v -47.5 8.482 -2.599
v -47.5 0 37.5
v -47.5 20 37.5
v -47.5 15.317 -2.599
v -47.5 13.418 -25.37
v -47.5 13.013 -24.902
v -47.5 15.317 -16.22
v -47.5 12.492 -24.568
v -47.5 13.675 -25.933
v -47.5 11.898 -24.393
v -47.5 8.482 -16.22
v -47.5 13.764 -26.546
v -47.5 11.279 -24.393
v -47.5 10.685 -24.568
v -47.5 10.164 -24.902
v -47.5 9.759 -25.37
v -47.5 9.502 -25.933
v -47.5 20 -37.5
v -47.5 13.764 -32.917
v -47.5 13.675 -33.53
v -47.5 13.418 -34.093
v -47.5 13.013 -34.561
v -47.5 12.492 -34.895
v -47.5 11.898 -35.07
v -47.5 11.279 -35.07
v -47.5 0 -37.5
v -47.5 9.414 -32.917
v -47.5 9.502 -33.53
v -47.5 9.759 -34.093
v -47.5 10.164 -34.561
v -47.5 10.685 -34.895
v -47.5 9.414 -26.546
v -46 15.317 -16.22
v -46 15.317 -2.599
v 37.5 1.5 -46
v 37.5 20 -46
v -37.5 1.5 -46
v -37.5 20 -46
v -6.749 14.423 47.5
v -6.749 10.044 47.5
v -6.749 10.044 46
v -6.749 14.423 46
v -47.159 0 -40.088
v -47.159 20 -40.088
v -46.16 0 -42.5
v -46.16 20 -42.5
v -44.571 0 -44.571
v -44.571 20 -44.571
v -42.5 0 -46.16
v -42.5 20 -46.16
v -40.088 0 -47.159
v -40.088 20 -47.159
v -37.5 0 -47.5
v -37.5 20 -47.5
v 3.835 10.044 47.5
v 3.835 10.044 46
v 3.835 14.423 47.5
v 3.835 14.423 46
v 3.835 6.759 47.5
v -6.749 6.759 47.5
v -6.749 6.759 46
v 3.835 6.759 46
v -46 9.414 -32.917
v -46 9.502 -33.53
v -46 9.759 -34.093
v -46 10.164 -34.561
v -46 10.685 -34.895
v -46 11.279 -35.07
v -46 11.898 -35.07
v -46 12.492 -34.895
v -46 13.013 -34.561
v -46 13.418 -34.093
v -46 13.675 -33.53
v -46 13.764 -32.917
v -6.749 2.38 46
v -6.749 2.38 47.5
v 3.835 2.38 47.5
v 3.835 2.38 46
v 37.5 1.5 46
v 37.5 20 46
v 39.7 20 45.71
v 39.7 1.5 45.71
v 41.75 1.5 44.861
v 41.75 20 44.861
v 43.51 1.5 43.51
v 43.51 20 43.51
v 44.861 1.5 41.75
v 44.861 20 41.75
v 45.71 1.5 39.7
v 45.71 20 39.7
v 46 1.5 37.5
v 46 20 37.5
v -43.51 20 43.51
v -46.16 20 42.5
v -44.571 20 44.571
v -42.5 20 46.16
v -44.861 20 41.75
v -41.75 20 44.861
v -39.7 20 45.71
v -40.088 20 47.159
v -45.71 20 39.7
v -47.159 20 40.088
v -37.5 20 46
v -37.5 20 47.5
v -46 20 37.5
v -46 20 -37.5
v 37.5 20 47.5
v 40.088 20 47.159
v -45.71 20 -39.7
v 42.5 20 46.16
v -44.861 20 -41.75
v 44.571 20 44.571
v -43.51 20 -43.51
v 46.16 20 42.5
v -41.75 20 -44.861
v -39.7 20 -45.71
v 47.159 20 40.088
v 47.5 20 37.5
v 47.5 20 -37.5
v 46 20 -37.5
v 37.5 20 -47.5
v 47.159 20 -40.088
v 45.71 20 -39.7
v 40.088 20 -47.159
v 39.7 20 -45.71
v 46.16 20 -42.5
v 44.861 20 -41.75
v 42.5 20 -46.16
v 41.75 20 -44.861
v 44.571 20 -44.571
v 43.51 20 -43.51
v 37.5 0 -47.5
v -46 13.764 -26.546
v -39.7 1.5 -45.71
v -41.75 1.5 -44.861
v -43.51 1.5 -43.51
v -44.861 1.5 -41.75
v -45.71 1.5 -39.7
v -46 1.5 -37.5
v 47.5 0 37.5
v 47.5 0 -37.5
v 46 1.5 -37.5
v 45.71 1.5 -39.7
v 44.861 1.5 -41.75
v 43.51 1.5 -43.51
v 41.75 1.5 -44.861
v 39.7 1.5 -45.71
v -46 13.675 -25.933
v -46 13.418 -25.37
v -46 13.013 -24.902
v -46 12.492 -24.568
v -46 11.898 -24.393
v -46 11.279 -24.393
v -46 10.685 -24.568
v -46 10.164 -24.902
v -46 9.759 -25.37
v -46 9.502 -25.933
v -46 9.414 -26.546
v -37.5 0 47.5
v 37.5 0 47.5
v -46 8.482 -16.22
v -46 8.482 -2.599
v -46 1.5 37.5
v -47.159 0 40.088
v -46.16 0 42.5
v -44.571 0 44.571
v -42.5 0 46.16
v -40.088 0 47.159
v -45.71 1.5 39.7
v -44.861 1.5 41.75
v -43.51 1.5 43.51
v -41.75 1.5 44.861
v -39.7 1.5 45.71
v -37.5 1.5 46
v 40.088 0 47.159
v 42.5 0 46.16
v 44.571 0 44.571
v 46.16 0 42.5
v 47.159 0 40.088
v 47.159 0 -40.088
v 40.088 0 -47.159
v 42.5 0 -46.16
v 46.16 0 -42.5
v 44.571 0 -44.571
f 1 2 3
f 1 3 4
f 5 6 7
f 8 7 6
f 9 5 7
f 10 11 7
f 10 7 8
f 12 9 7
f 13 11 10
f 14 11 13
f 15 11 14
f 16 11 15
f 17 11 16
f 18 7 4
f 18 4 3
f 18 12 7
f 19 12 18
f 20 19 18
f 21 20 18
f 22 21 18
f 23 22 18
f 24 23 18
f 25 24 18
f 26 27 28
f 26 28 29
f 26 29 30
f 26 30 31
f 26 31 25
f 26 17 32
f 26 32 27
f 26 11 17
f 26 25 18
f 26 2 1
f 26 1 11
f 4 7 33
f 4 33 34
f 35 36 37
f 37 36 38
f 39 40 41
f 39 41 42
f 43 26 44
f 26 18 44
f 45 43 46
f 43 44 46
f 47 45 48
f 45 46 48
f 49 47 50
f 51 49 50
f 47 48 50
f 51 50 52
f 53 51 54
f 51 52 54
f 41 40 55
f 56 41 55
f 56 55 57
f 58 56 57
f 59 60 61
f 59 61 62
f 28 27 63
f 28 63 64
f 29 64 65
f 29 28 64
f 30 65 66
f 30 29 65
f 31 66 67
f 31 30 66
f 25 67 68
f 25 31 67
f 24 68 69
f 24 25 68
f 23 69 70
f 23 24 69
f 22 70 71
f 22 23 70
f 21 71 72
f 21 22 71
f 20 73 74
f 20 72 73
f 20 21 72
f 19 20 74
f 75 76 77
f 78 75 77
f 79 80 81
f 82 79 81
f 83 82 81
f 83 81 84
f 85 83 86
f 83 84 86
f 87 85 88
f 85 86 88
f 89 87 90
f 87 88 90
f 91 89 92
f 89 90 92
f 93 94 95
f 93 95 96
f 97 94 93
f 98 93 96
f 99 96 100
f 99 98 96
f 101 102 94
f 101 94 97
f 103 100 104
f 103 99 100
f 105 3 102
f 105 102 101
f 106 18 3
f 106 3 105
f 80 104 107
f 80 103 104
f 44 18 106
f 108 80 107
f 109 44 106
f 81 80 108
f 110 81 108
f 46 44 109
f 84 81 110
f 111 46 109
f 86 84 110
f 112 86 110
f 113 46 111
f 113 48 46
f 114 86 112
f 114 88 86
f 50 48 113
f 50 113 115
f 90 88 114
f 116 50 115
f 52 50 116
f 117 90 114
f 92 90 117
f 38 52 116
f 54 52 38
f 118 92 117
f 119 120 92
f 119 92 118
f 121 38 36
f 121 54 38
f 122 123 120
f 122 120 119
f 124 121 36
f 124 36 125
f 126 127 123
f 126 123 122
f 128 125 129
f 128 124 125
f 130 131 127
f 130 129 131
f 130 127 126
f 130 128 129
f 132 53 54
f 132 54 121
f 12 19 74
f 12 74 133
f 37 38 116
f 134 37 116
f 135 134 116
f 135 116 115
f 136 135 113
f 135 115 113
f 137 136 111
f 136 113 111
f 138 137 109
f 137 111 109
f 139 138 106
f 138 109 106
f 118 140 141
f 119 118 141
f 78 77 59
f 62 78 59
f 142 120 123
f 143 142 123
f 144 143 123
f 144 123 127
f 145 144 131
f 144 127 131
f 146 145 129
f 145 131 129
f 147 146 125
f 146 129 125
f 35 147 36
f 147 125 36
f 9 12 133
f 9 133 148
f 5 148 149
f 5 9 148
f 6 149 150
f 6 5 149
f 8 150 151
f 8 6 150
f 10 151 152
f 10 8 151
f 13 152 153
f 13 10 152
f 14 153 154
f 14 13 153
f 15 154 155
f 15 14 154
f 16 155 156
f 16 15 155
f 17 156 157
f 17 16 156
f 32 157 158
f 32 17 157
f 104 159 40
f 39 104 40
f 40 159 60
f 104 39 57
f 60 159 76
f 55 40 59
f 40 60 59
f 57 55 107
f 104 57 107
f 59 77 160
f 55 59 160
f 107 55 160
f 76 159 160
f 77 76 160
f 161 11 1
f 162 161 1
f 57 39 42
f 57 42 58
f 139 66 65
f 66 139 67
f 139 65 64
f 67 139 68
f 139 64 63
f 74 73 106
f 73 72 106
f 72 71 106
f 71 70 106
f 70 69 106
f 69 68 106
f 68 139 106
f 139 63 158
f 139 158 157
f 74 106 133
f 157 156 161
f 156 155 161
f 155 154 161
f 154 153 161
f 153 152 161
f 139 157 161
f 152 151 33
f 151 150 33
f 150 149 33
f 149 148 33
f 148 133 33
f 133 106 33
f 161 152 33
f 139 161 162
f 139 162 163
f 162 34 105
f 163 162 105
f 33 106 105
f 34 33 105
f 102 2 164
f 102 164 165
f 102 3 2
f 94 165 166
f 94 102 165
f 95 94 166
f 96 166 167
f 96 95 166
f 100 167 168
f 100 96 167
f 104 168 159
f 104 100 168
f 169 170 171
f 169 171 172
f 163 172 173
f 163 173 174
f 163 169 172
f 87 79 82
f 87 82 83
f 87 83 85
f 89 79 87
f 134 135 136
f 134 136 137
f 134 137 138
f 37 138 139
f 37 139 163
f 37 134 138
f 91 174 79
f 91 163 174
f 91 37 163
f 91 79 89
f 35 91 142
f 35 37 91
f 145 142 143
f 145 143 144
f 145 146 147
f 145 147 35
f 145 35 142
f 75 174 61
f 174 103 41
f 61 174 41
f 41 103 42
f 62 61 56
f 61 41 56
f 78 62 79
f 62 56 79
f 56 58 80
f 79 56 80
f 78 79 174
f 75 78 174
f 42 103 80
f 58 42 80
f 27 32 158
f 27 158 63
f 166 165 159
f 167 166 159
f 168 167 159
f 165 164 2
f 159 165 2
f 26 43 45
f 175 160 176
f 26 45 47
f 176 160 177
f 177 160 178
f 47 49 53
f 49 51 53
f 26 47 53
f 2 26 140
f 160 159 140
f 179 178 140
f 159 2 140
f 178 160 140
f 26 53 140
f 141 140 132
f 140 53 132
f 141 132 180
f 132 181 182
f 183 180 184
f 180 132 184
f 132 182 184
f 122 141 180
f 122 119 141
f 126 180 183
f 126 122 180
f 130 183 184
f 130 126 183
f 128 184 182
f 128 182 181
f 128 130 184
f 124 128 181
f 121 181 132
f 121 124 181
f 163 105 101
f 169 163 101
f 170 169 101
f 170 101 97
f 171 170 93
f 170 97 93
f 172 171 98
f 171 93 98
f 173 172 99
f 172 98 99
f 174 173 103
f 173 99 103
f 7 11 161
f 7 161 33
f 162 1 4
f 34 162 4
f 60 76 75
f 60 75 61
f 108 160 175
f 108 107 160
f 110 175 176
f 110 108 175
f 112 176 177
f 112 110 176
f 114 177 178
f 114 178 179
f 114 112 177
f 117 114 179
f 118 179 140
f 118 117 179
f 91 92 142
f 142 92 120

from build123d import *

# Parameters (mm, degrees)
SKETCH1_W           = 95
SKETCH1_H           = 95
BOSS_EXTRUDE1_DEPTH = 20
FILLET1_R           = 10
CUT_EXTRUDE5_DEPTH  = 18.5
CUT_EXTRUDE6_DEPTH  = 10
SKETCH6_W           = 13.621181439
SKETCH6_H           = 6.835350155
CUT_EXTRUDE7_DEPTH  = 10
SKETCH9_W           = 10.583669907
SKETCH9_H           = 4.379449617
CUT_EXTRUDE10_DEPTH = 10


with BuildPart() as part:
    # Sketch1 → Boss-Extrude1 (new body)
    with BuildSketch(Plane(origin=(0, 0, 0), x_dir=(1, 0, 0), z_dir=(0, 1, 0))):
        Rectangle(SKETCH1_W, SKETCH1_H)
    extrude(amount=BOSS_EXTRUDE1_DEPTH)

    # Fillet1
    fillet1_edges = [part.edges().sort_by_distance(p)[0] for p in [
        (47.5, 10, 47.5),
        (-47.5, 10, 47.5),
        (-47.5, 10, -47.5),
        (47.5, 10, -47.5),
    ]]
    fillet(fillet1_edges, radius=FILLET1_R)

    # Sketch4 → Cut-Extrude5 (cut)
    with BuildSketch(Plane(origin=(0, 20, 0), x_dir=(1, 0, 0), z_dir=(0, 1, 0))):
        with BuildLine():
            Line((37.5, 46), (-37.5, 46))
            ThreePointArc((-37.5, 46), (-43.51040764, 43.51040764), (-46, 37.5))
            Line((-46, 37.5), (-46, -37.5))
            ThreePointArc((-46, -37.5), (-43.51040764, -43.51040764), (-37.5, -46))
            Line((-37.5, -46), (37.5, -46))
            ThreePointArc((37.5, -46), (43.51040764, -43.51040764), (46, -37.5))
            Line((46, -37.5), (46, 37.5))
            ThreePointArc((46, 37.5), (43.51040764, 43.51040764), (37.5, 46))
        make_face()
    extrude(amount=-CUT_EXTRUDE5_DEPTH, mode=Mode.SUBTRACT)

    # Sketch5 → Cut-Extrude6 (cut)
    with BuildSketch(Plane.ZY.offset(47.5)):
        with BuildLine():
            Line((-32.917062514, 13.76355051), (-26.545864744, 13.76355051))
            ThreePointArc((-26.545864744, 13.76355051), (-24.370980604, 11.588666369), (-26.545864744, 9.413782229))
            Line((-26.545864744, 9.413782229), (-32.917062514, 9.413782229))
            ThreePointArc((-32.917062514, 9.413782229), (-35.091946654, 11.588666369), (-32.917062514, 13.76355051))
        make_face()
    extrude(amount=-CUT_EXTRUDE6_DEPTH, mode=Mode.SUBTRACT)

    # Sketch6 → Cut-Extrude7 (cut)
    with BuildSketch(Plane.ZY.offset(47.5)):
        with Locations((-9.409539708, 11.899364103)):
            Rectangle(SKETCH6_W, SKETCH6_H)
    extrude(amount=-CUT_EXTRUDE7_DEPTH, mode=Mode.SUBTRACT)

    # Sketch9 → Cut-Extrude10 (cut)
    with BuildSketch(Plane.XY.offset(47.5)):
        with Locations((-1.457227674, 4.56970852)):
            Rectangle(SKETCH9_W, SKETCH9_H)
        with Locations((-1.457227674, 12.233745351)):
            Rectangle(SKETCH9_W, SKETCH9_H)
    extrude(amount=-CUT_EXTRUDE10_DEPTH, mode=Mode.SUBTRACT)


solid = part.part
